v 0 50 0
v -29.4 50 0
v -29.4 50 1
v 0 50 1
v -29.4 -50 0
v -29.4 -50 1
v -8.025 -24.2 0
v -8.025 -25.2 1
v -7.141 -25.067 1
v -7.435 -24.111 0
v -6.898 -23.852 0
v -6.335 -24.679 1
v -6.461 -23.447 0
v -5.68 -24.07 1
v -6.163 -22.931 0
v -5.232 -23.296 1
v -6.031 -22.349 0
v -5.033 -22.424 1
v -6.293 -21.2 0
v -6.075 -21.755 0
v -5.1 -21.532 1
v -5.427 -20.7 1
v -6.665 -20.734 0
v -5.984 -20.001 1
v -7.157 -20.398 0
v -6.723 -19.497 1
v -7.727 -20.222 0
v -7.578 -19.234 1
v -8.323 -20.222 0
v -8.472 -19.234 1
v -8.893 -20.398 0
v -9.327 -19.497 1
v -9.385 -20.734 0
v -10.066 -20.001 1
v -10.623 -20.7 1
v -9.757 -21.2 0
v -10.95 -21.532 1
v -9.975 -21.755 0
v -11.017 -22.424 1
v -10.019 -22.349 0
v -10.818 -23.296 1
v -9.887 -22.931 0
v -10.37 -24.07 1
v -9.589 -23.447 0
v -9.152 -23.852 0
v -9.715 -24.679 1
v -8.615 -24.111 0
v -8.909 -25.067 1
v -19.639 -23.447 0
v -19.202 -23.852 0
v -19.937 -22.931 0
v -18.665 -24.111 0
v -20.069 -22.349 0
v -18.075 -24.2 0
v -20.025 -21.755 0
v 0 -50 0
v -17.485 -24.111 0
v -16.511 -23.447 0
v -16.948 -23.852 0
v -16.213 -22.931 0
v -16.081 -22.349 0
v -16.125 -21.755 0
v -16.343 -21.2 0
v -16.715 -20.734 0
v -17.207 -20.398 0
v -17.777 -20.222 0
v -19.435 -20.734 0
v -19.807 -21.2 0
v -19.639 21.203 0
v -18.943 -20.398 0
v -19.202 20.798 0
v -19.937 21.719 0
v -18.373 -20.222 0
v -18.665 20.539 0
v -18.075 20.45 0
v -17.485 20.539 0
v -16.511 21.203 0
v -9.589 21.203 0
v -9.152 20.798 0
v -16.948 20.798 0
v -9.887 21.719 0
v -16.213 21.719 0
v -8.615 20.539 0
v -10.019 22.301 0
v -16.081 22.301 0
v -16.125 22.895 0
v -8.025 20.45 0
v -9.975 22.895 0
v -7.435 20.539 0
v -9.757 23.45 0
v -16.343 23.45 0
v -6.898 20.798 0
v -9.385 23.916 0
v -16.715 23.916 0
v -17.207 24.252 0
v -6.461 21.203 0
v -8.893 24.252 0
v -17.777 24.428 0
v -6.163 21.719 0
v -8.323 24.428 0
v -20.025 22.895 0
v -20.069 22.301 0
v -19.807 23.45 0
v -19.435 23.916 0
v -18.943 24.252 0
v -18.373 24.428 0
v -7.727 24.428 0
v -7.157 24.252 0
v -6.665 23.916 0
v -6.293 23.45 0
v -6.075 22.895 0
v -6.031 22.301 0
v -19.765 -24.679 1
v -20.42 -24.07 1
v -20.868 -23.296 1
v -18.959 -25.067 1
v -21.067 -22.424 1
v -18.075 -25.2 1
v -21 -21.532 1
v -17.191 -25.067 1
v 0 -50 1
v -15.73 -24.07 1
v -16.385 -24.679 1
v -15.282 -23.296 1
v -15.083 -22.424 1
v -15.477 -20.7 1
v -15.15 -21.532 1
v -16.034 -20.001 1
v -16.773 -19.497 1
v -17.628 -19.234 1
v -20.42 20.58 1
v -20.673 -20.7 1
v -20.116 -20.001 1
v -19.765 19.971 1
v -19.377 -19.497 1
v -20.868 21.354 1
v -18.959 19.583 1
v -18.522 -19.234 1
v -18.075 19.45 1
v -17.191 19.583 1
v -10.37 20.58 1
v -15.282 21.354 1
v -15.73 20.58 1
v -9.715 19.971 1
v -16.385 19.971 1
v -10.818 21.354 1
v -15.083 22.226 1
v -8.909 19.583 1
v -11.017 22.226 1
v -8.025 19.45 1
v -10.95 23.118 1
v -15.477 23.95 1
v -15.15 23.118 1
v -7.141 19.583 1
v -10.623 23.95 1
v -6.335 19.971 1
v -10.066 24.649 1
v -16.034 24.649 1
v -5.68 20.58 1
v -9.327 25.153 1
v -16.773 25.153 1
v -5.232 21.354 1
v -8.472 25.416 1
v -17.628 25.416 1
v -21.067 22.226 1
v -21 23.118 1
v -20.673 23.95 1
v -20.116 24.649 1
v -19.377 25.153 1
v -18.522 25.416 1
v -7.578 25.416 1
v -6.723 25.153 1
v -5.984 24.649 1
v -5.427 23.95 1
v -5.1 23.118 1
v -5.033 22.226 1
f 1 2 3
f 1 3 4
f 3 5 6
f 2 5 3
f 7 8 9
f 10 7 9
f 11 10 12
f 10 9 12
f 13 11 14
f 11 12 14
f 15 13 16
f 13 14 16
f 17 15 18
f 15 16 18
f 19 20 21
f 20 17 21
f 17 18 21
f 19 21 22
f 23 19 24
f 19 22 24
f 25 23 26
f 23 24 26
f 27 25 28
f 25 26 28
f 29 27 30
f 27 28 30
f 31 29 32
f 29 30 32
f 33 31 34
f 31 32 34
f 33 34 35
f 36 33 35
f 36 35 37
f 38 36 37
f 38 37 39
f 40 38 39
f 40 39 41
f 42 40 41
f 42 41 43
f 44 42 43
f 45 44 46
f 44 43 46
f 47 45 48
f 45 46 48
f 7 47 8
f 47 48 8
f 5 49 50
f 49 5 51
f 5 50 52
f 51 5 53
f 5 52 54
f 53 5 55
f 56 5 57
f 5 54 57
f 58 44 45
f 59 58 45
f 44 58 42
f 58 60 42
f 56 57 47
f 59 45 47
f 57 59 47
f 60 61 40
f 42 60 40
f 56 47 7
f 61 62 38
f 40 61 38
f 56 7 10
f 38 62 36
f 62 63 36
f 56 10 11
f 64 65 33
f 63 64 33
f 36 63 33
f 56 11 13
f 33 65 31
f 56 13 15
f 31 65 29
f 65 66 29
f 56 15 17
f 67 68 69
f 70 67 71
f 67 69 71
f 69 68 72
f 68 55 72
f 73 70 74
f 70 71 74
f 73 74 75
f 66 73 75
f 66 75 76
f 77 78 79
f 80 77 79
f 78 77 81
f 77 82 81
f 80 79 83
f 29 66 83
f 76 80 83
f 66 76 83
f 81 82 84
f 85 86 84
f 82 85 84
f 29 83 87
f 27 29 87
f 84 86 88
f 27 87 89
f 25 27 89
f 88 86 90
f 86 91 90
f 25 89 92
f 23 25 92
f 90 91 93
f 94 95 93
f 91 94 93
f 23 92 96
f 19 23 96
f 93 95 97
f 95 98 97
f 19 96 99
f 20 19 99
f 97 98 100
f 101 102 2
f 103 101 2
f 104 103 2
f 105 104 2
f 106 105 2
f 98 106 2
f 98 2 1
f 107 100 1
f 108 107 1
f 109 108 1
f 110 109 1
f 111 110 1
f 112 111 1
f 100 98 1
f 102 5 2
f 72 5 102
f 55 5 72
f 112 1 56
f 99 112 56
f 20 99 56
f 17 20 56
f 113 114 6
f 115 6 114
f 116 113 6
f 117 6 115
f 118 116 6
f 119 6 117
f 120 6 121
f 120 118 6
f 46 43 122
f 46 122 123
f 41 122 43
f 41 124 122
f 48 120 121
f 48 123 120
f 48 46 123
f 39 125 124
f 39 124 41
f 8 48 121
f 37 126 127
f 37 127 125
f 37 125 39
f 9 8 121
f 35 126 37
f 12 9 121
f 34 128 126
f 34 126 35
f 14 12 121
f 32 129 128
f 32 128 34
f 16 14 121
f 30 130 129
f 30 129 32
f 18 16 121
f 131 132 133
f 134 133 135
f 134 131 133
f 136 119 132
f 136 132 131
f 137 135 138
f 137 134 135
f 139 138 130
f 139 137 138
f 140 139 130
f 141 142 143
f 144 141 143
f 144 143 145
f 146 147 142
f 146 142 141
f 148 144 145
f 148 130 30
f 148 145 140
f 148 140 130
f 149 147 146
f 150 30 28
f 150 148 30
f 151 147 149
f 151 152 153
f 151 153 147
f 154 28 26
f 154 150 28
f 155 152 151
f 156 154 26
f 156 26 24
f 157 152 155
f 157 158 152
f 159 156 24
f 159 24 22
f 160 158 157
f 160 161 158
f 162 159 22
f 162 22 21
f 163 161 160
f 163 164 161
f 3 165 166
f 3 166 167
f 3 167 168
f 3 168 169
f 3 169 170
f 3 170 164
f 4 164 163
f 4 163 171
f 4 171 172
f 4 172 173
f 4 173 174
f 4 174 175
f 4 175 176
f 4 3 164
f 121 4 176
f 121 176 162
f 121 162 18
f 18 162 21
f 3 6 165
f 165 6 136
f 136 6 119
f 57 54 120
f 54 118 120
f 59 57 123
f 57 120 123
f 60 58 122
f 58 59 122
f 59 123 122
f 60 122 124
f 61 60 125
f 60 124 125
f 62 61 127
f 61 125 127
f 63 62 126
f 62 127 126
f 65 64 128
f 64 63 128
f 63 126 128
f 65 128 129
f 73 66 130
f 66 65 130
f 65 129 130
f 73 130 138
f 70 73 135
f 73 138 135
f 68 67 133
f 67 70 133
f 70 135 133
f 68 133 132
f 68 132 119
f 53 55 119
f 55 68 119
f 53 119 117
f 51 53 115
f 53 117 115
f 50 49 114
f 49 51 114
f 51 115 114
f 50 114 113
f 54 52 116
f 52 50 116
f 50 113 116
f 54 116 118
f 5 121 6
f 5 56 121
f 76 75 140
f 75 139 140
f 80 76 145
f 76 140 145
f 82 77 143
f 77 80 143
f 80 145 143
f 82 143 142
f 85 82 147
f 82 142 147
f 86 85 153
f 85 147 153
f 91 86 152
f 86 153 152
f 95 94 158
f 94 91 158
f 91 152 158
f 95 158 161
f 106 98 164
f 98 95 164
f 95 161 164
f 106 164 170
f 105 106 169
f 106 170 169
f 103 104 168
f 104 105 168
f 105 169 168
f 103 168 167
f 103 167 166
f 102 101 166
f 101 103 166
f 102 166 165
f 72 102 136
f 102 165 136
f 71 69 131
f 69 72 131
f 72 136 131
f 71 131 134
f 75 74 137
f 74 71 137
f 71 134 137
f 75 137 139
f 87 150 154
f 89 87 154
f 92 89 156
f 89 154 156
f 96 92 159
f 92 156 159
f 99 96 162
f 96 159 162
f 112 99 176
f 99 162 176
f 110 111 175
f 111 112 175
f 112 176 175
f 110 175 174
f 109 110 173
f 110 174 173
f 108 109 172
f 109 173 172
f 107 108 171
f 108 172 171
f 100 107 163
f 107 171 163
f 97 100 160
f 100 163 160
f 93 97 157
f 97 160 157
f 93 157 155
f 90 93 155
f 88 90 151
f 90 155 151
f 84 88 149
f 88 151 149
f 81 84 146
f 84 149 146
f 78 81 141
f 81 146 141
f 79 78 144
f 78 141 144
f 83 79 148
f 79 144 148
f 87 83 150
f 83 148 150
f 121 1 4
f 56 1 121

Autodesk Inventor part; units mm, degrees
ref_plane "YZ Plane" through (0, 0, 0) normal (1, 0, 0) x (0, 1, 0)
ref_plane "XZ Plane" through (0, 0, 0) normal (0, 1, 0) x (-1, 0, 0)
ref_plane "XY Plane" through (0, 0, 0) normal (0, 0, 1) x (1, 0, 0)
sketch "Sketch1" plane through (0, 0, 0) normal (0, 0, 1) x (1, 0, 0)
  line L0 (0, -50) -> (-29.4, -50)
  line L1 (-29.4, -50) -> (-29.4, 50)
  line L2 (-29.4, 50) -> (0, 50)
  line L3 (0, 50) -> (0, -50)
  line L4 (0, -13.95) -> (-29.4, -13.95) projected
  point P0 (0, 0)
  dimension "d0" = 50
  dimension "d1" = 50
  dimension "d2" = 0
extrude "Extrusion1" add sketch "Sketch1" along normal blind 1
sketch "Sketch2" plane through (0, 0, 1) normal (0, 0, 1) x (1, 0, 0)
  circle A0 centre (-8.025, -22.2) radius 1.425 projected
  circle A1 centre (-18.075, -22.2) radius 1.425 projected
  line L0 (-27.4, -19.2) -> (0, -19.2) projected
  line L1 (-27.4, -19.2) -> (-27.4, -28.5) projected
  line L2 (-27.4, -28.5) -> (0, -28.5) projected
  line L3 (0, -19.2) -> (0, -28.5) projected
  circle A2 centre (-8.025, 22.45) radius 1.2295 projected
  circle A3 centre (-18.075, 22.45) radius 1.2295 projected
  line L4 (-27.4, 19.2) -> (0, 19.2) projected
  line L5 (0, 19.2) -> (0, 28.5) projected
  line L6 (0, 28.5) -> (-27.4, 28.5) projected
  line L7 (-27.4, 19.2) -> (-27.4, 28.5) projected
  point P0 (0, 0)
hole "Hole1" at (-8.025, -22.2, 1) at (-18.075, -22.2, 1) at (-18.075, 22.45, 1) at (-8.025, 22.45, 1) direction (0, 0, -1) diameter 3 depth 10 countersink diameter 6 countersink angle 90
properties part number "MetalBack" material "Stainless Steel"
